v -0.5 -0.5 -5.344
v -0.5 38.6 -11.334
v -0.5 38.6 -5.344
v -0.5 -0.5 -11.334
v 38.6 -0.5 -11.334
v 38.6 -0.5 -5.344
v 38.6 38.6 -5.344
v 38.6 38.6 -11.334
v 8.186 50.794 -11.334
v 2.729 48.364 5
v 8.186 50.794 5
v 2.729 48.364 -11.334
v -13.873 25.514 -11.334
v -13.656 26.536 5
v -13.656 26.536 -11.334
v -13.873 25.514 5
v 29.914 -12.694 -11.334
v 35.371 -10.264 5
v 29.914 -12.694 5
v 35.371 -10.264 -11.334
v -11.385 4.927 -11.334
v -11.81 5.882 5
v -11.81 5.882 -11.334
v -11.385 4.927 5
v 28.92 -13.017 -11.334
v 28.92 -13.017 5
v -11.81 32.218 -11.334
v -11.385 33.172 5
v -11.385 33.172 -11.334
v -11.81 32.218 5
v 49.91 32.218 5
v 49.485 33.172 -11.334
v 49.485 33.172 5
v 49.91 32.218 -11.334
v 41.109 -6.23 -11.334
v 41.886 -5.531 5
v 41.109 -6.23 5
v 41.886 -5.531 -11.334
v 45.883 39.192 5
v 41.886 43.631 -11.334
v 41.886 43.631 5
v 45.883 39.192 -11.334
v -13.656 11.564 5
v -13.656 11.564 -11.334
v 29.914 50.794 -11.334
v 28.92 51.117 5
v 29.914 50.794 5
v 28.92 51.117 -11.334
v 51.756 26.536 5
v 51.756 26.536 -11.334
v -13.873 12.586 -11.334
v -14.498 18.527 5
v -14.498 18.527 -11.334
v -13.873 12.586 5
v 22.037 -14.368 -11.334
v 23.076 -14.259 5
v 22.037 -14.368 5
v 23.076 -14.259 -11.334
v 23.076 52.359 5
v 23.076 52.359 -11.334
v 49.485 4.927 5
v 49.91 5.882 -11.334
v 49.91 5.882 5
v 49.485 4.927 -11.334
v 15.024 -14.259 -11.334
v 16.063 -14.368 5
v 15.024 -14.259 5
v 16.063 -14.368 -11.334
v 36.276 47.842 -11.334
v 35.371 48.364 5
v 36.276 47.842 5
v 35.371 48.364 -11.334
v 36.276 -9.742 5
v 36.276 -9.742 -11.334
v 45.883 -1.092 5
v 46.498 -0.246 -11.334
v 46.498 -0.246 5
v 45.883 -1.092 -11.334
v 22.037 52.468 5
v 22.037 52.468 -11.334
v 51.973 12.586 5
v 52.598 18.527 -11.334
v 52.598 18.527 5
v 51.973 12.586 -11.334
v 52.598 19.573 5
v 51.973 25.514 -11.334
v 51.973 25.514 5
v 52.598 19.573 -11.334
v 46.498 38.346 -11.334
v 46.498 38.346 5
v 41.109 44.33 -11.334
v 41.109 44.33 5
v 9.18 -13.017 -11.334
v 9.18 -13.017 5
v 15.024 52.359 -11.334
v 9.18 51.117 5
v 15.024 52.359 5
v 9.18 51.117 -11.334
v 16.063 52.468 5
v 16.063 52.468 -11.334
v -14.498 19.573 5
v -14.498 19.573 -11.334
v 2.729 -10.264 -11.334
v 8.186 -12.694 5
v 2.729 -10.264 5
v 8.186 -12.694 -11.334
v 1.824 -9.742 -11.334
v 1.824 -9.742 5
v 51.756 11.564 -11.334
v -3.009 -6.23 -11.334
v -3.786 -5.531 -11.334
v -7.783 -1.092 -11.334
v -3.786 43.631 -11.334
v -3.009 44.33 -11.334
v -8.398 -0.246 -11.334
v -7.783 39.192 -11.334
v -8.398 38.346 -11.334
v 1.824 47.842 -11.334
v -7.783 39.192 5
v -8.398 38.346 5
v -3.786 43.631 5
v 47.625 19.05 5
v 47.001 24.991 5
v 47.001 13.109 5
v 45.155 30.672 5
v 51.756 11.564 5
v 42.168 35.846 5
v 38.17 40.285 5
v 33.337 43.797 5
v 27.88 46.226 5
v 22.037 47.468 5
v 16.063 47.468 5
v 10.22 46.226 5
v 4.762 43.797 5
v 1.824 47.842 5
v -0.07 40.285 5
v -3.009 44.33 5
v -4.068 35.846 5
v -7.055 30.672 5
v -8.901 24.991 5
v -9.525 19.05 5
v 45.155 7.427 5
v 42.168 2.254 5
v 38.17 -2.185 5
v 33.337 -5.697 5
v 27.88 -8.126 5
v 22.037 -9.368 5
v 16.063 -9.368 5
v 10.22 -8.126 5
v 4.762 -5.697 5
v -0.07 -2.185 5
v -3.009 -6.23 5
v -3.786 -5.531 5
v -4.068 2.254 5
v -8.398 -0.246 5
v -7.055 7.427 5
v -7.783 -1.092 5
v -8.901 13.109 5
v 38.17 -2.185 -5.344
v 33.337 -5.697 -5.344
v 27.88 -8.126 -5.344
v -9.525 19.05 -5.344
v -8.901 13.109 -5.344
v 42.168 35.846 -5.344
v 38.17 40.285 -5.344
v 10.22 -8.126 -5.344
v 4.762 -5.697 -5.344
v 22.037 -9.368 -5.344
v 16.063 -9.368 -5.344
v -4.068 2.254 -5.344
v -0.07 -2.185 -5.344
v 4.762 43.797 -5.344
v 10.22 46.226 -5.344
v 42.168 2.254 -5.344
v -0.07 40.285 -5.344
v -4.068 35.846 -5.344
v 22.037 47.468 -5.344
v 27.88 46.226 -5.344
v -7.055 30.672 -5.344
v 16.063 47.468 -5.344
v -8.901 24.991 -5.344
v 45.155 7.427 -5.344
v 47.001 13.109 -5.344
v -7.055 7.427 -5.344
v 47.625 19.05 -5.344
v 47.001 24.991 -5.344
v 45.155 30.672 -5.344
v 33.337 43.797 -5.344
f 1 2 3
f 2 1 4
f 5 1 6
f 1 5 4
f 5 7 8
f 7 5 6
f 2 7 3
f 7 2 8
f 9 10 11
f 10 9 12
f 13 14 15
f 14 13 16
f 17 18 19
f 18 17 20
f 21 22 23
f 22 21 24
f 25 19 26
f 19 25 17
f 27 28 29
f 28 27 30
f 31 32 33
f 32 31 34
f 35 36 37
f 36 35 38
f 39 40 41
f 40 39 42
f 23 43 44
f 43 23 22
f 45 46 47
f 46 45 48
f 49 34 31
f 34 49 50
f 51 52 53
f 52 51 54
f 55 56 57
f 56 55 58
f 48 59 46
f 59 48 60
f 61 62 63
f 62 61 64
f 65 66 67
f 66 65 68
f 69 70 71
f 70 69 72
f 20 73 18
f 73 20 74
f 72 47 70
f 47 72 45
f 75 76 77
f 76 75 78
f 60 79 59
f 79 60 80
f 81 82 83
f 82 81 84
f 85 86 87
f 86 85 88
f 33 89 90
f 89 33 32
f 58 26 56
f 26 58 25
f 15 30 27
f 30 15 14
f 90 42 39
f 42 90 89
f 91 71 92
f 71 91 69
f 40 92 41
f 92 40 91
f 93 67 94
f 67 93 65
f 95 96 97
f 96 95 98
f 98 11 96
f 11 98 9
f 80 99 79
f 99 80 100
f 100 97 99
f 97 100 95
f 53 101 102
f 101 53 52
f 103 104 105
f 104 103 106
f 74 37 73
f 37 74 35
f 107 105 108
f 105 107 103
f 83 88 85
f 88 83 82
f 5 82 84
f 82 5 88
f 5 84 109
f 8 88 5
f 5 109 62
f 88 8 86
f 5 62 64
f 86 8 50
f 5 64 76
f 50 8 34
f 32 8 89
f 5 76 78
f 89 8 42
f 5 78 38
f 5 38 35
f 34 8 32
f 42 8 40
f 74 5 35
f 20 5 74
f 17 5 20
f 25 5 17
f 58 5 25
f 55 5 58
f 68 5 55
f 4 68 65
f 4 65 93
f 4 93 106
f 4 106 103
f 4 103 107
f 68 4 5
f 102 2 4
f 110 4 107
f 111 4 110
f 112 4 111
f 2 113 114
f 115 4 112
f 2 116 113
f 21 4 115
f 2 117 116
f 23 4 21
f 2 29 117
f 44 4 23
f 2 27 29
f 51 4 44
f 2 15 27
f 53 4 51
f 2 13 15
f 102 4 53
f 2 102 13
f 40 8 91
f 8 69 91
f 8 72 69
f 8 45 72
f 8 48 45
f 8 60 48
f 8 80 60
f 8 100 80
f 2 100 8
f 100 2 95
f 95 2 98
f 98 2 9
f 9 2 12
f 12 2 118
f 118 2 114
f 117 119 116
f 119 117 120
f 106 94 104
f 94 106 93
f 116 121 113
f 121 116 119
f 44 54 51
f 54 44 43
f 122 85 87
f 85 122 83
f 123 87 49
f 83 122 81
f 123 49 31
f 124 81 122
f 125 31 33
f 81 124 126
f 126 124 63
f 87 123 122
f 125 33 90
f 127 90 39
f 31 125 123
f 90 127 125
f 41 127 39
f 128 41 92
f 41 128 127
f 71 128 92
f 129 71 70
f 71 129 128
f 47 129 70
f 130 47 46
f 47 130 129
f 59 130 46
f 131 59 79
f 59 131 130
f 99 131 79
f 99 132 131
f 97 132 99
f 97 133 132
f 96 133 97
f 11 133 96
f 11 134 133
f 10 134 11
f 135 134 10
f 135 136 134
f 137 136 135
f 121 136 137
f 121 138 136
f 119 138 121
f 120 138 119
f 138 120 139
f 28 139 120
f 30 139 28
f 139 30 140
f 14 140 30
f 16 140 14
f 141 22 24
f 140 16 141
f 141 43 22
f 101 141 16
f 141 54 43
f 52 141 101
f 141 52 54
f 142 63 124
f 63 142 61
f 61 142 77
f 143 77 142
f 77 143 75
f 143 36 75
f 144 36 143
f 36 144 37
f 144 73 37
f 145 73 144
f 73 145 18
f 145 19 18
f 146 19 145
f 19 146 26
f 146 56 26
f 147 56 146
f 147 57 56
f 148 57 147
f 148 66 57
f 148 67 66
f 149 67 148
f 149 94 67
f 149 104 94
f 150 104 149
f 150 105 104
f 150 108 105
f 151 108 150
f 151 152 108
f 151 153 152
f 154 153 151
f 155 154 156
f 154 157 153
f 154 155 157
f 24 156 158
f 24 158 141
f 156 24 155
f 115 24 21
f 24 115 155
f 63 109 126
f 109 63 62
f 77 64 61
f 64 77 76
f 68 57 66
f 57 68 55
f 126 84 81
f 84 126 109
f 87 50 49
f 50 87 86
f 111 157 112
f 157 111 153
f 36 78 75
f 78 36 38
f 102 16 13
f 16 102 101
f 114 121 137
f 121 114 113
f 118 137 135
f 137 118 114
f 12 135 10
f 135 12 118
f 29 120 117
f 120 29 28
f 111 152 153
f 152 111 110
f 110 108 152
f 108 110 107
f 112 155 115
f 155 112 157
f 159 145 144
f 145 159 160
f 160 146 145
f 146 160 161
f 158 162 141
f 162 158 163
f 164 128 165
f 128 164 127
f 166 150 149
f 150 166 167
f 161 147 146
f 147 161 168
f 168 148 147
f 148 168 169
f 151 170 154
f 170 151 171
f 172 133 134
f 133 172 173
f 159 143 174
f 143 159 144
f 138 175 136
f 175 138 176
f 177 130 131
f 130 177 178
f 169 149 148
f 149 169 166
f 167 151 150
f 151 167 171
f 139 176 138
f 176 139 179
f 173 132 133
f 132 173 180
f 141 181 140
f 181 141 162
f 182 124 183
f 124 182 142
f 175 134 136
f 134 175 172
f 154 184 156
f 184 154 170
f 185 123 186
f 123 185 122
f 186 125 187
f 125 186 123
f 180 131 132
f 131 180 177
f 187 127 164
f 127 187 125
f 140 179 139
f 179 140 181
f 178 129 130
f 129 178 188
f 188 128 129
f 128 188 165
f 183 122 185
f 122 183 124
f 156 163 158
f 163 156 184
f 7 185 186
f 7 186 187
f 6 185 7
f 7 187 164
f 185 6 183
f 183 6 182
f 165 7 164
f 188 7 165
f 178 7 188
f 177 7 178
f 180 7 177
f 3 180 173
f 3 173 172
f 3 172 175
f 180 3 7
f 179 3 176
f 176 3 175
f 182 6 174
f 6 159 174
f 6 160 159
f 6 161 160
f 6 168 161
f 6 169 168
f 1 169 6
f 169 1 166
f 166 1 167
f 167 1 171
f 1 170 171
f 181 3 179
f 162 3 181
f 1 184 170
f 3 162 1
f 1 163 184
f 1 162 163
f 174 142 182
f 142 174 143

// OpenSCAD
// file: ../../lib/circuits/helpers.scad
function bu(u) = u * 2.54;

module breadboard_row(number, orientation="vertical") {
  children();
  if(number > 1) {
    if(orientation == "vertical") {
      translate([0,bu(1),0])
        breadboard_row(number-1, orientation=orientation) {
          children();
        }
    } else {
      translate([bu(1),0,0])
        breadboard_row(number-1, orientation=orientation){
          children();
        }
    }
  }
}
// file: ../../lib/switches/rgb.scad
include <../variables.scad>

module rgb_row_trace_connection(width, height, xpos, ypos, rgb, connections) {
  half_width = u_mm(width)/2;
  half_height = u_mm(height)/2;
  if(connections[3] == "connect") {
    translate([1-half_width,8.875,0]){
      circle(d=0.8,$fn=40);
      offset(0.4)
        polygon(points=[[0,-0.01],[0,0.01],[u_mm(-xpos)-2, u_mm(-ypos)+0.01],[u_mm(-xpos)-2, u_mm(-ypos)-0.01]]);
    }
    translate([1-half_width,4.9,0]){
      circle(d=0.8,$fn=40);
      offset(0.4)
        polygon(points=[[0,-0.01],[0,0.01],[u_mm(-xpos)-2, u_mm(-ypos)+0.01],[u_mm(-xpos)-2, u_mm(-ypos)-0.01]]);
    }
    translate([1-half_width,3.3,0]){
      circle(d=0.8,$fn=40);
      offset(0.4)
        polygon(points=[[0,-0.01],[0,0.01],[u_mm(-xpos)-2, u_mm(-ypos)+0.01],[u_mm(-xpos)-2, u_mm(-ypos)-0.01]]);
    }
  }
  if(connections[2] == "connect") {
    translate([half_width-1,8.875,0]) {
      circle(d=0.8,$fn=40);
    }
    translate([half_width-1,4.9,0]) {
      circle(d=0.8,$fn=40);
    }
    translate([half_width-1,3.3,0]){
      circle(d=0.8,$fn=40);
    }
  }
}

module rgb_pcb_drill(width=1, height=1, rgb=true, connections=["hole","hole","hole","hole"]) {
  half_width = u_mm(width)/2;
  half_height = u_mm(height)/2;
  translate([half_width,half_height,0]) {
    if(rgb == true) {
      // LED Hole
      translate([-1.875,3.4])
        square([3.75,3]);

      // LED D
      if(connections[3] == "hole")
        translate([1.3-half_width,8,0])
          circle(d=1,$fn=40);
      if(connections[2] == "hole")
        translate([half_width-1.3,8,0])
          circle(d=1,$fn=40);

      // LED G
      if(connections[3] == "hole")
        translate([1.3-half_width,5.4,0])
          circle(d=1,$fn=40);
      if(connections[2] == "hole")
        translate([half_width-1.3,5.4,0])
          circle(d=1,$fn=40);

      // LED V
      if(connections[3] == "hole")
        translate([1.3-half_width,2.8,0])
          circle(d=1,$fn=40);
      if(connections[2] == "hole")
        translate([half_width-1.3,2.8,0])
          circle(d=1,$fn=40);
    }

    children();
  }
}

module rgb_pcb_hole_traces(width=1, height=1, rgb=true, xpos=0, ypos=0, connections=["hole","hole","hole","hole"]) {
  half_width = u_mm(width)/2;
  half_height = u_mm(height)/2;
  translate([half_width,half_height,0]) {
    if(rgb == true) {
      // LED D
      if(connections[3] == "hole")
        translate([1.3-half_width,8,0])
          circle(d=2.5,$fn=40);
      if(connections[2] == "hole")
        translate([half_width-1.3,8,0])
          circle(d=2.5,$fn=40);

      // LED G
      if(connections[3] == "hole")
        translate([1.3-half_width,5.4,0])
          circle(d=2.5,$fn=40);
      if(connections[2] == "hole")
        translate([half_width-1.3,5.4,0])
          circle(d=2.5,$fn=40);

      // LED V
      if(connections[3] == "hole")
        translate([1.3-half_width,2.8,0])
          circle(d=2.5,$fn=40);
      if(connections[2] == "hole")
        translate([half_width-1.3,2.8,0])
          circle(d=2.5,$fn=40);
    }

    children();
  }
}

module rgb_pcb_traces(width=1, height=1, rgb=true, xpos=0, ypos=0, connections=["hole","hole","hole","hole"]) {
  half_width = u_mm(width)/2;
  half_height = u_mm(height)/2;
  rgb_pcb_hole_traces(width=width, height=height, rgb=rgb, connections=connections) {
    if(rgb == true) {
      rgb_row_trace_connection(width=width, height=height, xpos=xpos, ypos=ypos, rgb=rgb, connections=connections);
      v_left = connections[3] == "none" ? 1 : half_width-5;
      // LED G
      translate([1.25,5])
        square([2,2]);
      translate([2.7,8.5,0]) {
        length = connections[2] == "none" ? 2 : half_width-3.7; 
        square([length,0.75]);
      }
      translate([2.7,6.8])
        square([0.8,2.4]);
      translate([-3.5,6.2])
        square([7,0.8]);
      translate([-3.5,6.8])
        square([0.8,2.4]);
      translate([-4-v_left,8.5,0])
        square([v_left+1,0.75]);

      // LED D
      translate([-4-v_left,4.5,0])
        square([v_left,0.8]);
      translate([-4.5,4.5,0])
        square([0.8,1.3]);
      translate([-4.5,5,0])
        square([1.3,0.8]);
      translate([2,4,0])
        square([2,0.8]);
      translate([4,4,0])
        square([0.8,1.3]);
      translate([4,4.5,0]) {
        length = connections[2] == "none" ? 0 : half_width-5; 
        square([length,0.75]);
      }
      translate([-3.375,5])
        square([2,1.1]);
      translate([1.25,3.75])
        square([2,1.1]);

      // LED V
      v_right = connections[2] == "none" ? 0 : half_width-5.25;
      translate([-4-v_left,2.9,0])
        square([v_right+v_left+8.875,0.8]);
      translate([-3.375,3.5])
        square([2,1.35]);
    }

    children();
  }
}
// file: ../../lib/switches/base.scad
include <../variables.scad>
include <rgb.scad>

// ["top", "bottom", "left", "right"]

module switch_row_trace_connection(width, height, xpos, ypos, rgb, connections) {
  half_width = u_mm(width)/2;
  half_height = u_mm(height)/2;
  if(connections[3] == "connect") {
    translate([1-half_width,-5.5,0]){
      circle(d=0.8,$fn=40);
      offset(0.4)
        polygon(points=[[0,-0.01],[0,0.01],[u_mm(-xpos)-2, u_mm(-ypos)+0.01],[u_mm(-xpos)-2, u_mm(-ypos)-0.01]]);
    }
  }
  if(connections[2] == "connect") {
    translate([half_width-1,-5.5,0]) {
      circle(d=0.8,$fn=40);
    }
  }
}

module switch_column_trace_connection(width, height, xpos, ypos, rgb, connections, last_xpos=0, last_ypos=0) {
  half_width = u_mm(width)/2;
  half_height = u_mm(height)/2;
  if(connections[1] == "connect") {
    translate([-u_mm((width-1)/2)-0.9,half_height-1,0]) {
      circle(d=0.8,$fn=40);
      offset(0.4)
        polygon(points=[[0,-0.01],[0,0.01],[u_mm((width-1)/2),0.01],[u_mm((width-1)/2),-0.01]]);
    }
  }
  if(connections[0] == "connect") {
    y_off = u_mm(ypos-last_ypos);
    x_off = u_mm(last_xpos-xpos);
    translate([-0.875,-1-y_off-half_height,0]) {
      offset(0.4)
        polygon(points=[[-0.01+x_off,0],[0.01+x_off,0],[0.01,2+y_off],[-0.01,2+y_off]]);
      translate([x_off-0.01,0]) {
        offset(0.4)
          polygon(points=[[0,-0.01],[0,0.01],[u_mm((width-1)/2)+1,0.01],[u_mm((width-1)/2)+1,-0.01]]);
      }
    }
  }
}

module switch_base_pcb_drill(width=1, height=1, rgb=true, single=true, connections=["hole","hole","hole","hole"]) {
  half_width = u_mm(width)/2;
  half_height = u_mm(height)/2;
  rgb_pcb_drill(width=width, height=height, rgb=rgb, connections=connections) {
    // Row
    if(connections[2] == "hole")
      translate([half_width-1.3,-5.5,0])
        circle(d=1,$fn=40);
    if(connections[3] == "hole")
      translate([1.3-half_width,-5.5,0])
        circle(d=1,$fn=40);

    // Column
    if(connections[1] == "hole")
      translate([-1,half_height-1.25,0])
        circle(d=1,$fn=40);
    if(connections[0] == "hole")
      translate([-1,1.25-half_height,0])
        circle(d=1,$fn=40);

    children();
  }
}

module switch_base_pcb_traces(width=1, height=1, rgb=true, xpos=0, ypos=0, connections=["hole","hole","hole","hole"], last_xpos=0, last_ypos=0, single=true) {
  half_width = u_mm(width)/2;
  half_height = u_mm(height)/2;
  rgb_pcb_traces(width=width, height=height, rgb=rgb, xpos=xpos, ypos=ypos, connections=connections) {
    switch_row_trace_connection(width, height, xpos, ypos, rgb, connections);
    if(single && !rgb)
      switch_column_trace_connection(width, height, xpos, ypos, rgb, connections, last_xpos=last_xpos, last_ypos=last_ypos);

    // Row
    if(connections[2] == "hole")
      translate([half_width-1.3,-5.5,0])
        circle(d=2.5,$fn=40);
    if(connections[3] == "hole")
      translate([1.3-half_width,-5.5,0])
        circle(d=2.5,$fn=40);

    // Column
    if(connections[1] == "hole")
      translate([-1,half_height-1.25,0])
        circle(d=2.4,$fn=40);
    if(connections[0] == "hole")
      translate([-1,1.25-half_height,0])
        circle(d=2.4,$fn=40);

    children();
  }
}

module switch_base_pcb_traces_bottom(width=1, height=1, rgb=true, xpos=0, ypos=0, connections=["hole","hole","hole","hole"], last_xpos=0, last_ypos=0) {
  half_width = u_mm(width)/2;
  half_height = u_mm(height)/2;
  rgb_pcb_hole_traces(width=width, height=height, rgb=rgb, connections=connections) {
    switch_column_trace_connection(width, height, xpos, ypos, rgb, connections, last_xpos=last_xpos, last_ypos=last_ypos);

    // Row
    if(connections[2] == "hole")
      translate([half_width-1.3,-5.5,0])
        circle(d=2.5,$fn=40);
    if(connections[3] == "hole")
      translate([1.3-half_width,-5.5,0])
        circle(d=2.5,$fn=40);

    // Column
    if(connections[1] == "hole")
      translate([-1,half_height-1.25,0])
        circle(d=2.5,$fn=40);
    if(connections[0] == "hole")
      translate([-1,1.25-half_height,0])
        circle(d=2.5,$fn=40);

    children();
  }
}
// file: ../../lib/switches/footprints.scad
include <../variables.scad>
include <stabilizers.scad>

module pcb_switch_outline(width=1, height=1) {
  stab_extra = width >= 2 ? 2 : 0;
  translate([0,-stab_extra])
    square([u_mm(width)+0.01, u_mm(height)+0.01+stab_extra]);
}

module pcb_switch_space_outline(width=1, height=1, style="mx", cnc=false) {
  offset = height_for_style(style);
  stab_extra = width >= 2 ? 2 : 0;
  translate([-1,-1-stab_extra,2.834-offset])
    cube([u_mm(width) + 2, u_mm(height) + 2 + stab_extra, 1.166+offset]);
  translate([u_mm(width/2),u_mm(height/2)]) {
    translate([-7.5,-7.5,1.5-offset])
      cube([15,15,5]);
    translate([-7,-7,-10])
      cube([14,14,10]);
    translate([u_mm(-width/2)-0.5,u_mm(-height/2)-0.5,-20-offset])
      cube([u_mm(width)+1,u_mm(height)+1, 20]);
  }
  translate([hole_offset(width), hole_offset(height),-10])
    stab(width);
}
// file: ../../lib/switches/stabilizers.scad
module stab_hole_render(distance){
  translate([14+distance+3.375,6.99,0]) {
    circle(d=3.175, $fn=40);
    translate([0,-15.24,0])
      circle(d=4.064, $fn=40);
  }
  translate([-6.75-distance+3.375,6.99,0]) {
    circle(d=3.175, $fn=40);
    translate([0,-15.24,0])
      circle(d=4.064, $fn=40);
  }
}

module stab_holes(width) {
  if (width >= 7) {
    stab_hole_render(39.6);
  } else if (width >= 6) {
    stab_hole_render(39.6);
  } else if(width >= 2) {
    stab_hole_render(1.6);
  }
}

module stab_render(distance, cnc=false, height=5.334) {
  translate([14+distance,1.47,0]){
    // Right Side Large Hole
    cube([6.75,12.3,10]);

    // Add 1/16" corner holes for milling
    if(cnc){
      translate([0.56,0.56,0])
        cylinder(h=10,d=1.59,$fn=20);
      translate([6.75-0.56,0.56,0])
        cylinder(h=10,d=1.59,$fn=20);
      translate([0.56,12.3-0.56,0])
        cylinder(h=10,d=1.59,$fn=20);
      translate([6.75-0.56,12.3-0.56,0])
        cylinder(h=10,d=1.59,$fn=20);
    }
    translate([5.75,3.23,0]){
      // Side hole for notch
      cube([1.825,3.175,10]);
      translate([1.825,1.59,0])
        if(cnc)
          resize([1.59,3.175,10])
            cylinder(h=10,d=1.59,$fn=20);
    }
    translate([1.725,11.3,0]){
      // Top Notch
      cube([3.3,2.2,10]);
      if(cnc)
        translate([1.65,2.2,0])
          resize([3.3,1,10])
            cylinder(h=10,d=1,$fn=20);
    }
    // Thin out for clip
    translate([-1,-1,10-height+1.5])
      cube([8.75,14.3,height-1.5]);
  }
  translate([-6.75-distance,1.47,0]){
    // Left Side Large Hole
    cube([6.75,12.3,10]);
    translate([-0.825,3.23,0]){
      // Side hole for notch
      cube([1.825,3.175,10]);
      if(cnc)
        translate([0,1.59,0])
          resize([1.59,3.175,10])
            cylinder(h=10,d=1.59,$fn=20);

    }
    translate([1.725,11.3,0]){
      // Top Notch
      cube([3.3,2.2,10]);
      if(cnc)
        translate([1.65,2.2,0])
          resize([3.3,1,10])
            cylinder(h=10,d=1,$fn=20);
    }
    if(cnc){
      translate([0.56,0.56,0])
        cylinder(h=10,d=1.59,$fn=20);
      translate([6.75-0.56,0.56,0])
        cylinder(h=10,d=1.59,$fn=20);
      translate([0.56,12.3-0.56,0])
        cylinder(h=10,d=1.59,$fn=20);
      translate([6.75-0.56,12.3-0.56,0])
        cylinder(h=10,d=1.59,$fn=20);
    }
    // Thin out for clip
    translate([-1,-1,10-height+1.5])
      cube([8.75,14.3,height-1.5]);
  }
  // Center shaft for bar
  translate([-distance-2,4.7,0]){
    cube([distance*2+20,4.6,10]);
  }
}

module stab(key_width, cnc=false) {
  if (key_width >= 7) {
    stab_render(39.6, cnc=cnc);
  } else if (key_width >= 6) {
    stab_render(39.6, cnc=cnc);
  } else if(key_width >= 2) {
    stab_render(1.6, cnc=cnc);
  }
}
// file: ../../lib/circuits/wire.scad
module guage(guage=12) {
  fn=20;
  if(guage == 8) {
    circle(d=3.25, $fn=fn);
  } else if (guage == 10) {
    circle(d=2.59, $fn=fn);
  } else if (guage == 12) {
    circle(d=2.06, $fn=fn);
  } else if (guage == 14) {
    circle(d=1.57, $fn=fn);
  } else if (guage == 16) {
    circle(d=1.3, $fn=fn);
  }
}

module wire_pcb_drill(guage=12) {
  offset(0.1)
    guage(guage);
}

module wire_pcb_traces(guage=12) {
  offset(0.75)
    guage(guage);
}

module wire_pcb_outline(guage=12) {
  offset(1.5)
    guage(guage);
}

module wire_space_outline(guage=12) {
  linear_extrude(10)
    offset(0.1)
      guage(guage);
}
// file: ../../lib/circuits/trrs.scad
module trrs_post(d=1.2) {
  translate([0,-d/4,0]) {
    circle(d=d, $fn=20);
    translate([-d/2,0,0]) {
      square([d,(d/2-.2)]);
    }
    translate([0,(d/2-.2),0]) {
      circle(d=d, $fn=20);
    }
  }
}

module trrs_pcb_drill(side="left") {
  translate([2.8,1.5]) {
    circle(d=2, $fn=20);
  }
  translate([2.8,8.5]) {
    circle(d=2, $fn=20);
  }
  translate([0.5,11.3,0]) {
    trrs_post();
  }
  translate([5.1,3.2,0]) {
    trrs_post();
  }
  translate([5.1,6.2,0]) {
    trrs_post();
  }
  translate([5.1,10.2,0]) {
    trrs_post();
  }
  if(side != "none"){
    offset = side == "left" ? 7.6 : -2;
    translate([offset,11.3]) {
      circle(d=1.2, $fn=20);
    }
    translate([offset,8.3]) {
      circle(d=1.2, $fn=20);
    }
    translate([offset,5.3]) {
      circle(d=1.2, $fn=20);
    }
    translate([offset,2.2]) {
      circle(d=1.2, $fn=20);
    }
  }
}

module trrs_pcb_traces(side="left") {
  translate([-1,9.7,0]){
    difference() {
      square([3,3]);
      if(side == "right") {
        translate([3,-1.8]) {
          rotate(45) {
            square(2);
          }
        }
      }
    }
  }
  translate([3.6,1.2,0]){
    difference() {
      square([3,3.5]);
      if(side == "left") {
        translate([3,2.3]) {
          rotate(45) {
            square(2);
          }
        }
      }
    }
  }
  translate([3.6,4.8,0]){
    difference() {
        square([3,3.5]);
        if(side == "left") {
          translate([3,2.3]) {
            rotate(45) {
              square(2);
            }
          }
        }
    }
  }
  translate([3.6,8.4,0]){
    difference() {
      square([3,3.2]);
      if(side == "left") {
        translate([3,1.8]) {
          rotate(45) {
            square(2);
          }
        }
      }
    }
  }
  if(side != "none"){
    translate([side == "left" ? 7.6 : -2,0,0]){
      translate([0,11.3]) {
        circle(d=3, $fn=20);
      }
      translate([0,8.3]) {
        circle(d=2.9, $fn=20);
      }
      translate([0,5.3]) {
        circle(d=3, $fn=20);
      }
      translate([0,2.2]) {
        circle(d=3, $fn=20);
      }
    }
    translate([side == "left" ? 5.6 : -2,0,0]){
      left_trace = side == "left" ? 2.5 : 7.6;
      translate([0,2.2]) {
        square([left_trace,1.5]);
      }
      translate([0,5.1]) {
        square([left_trace,1.5]);
      }
      if(side == "left") {
        translate([0,8.7]) {
          square([left_trace,0.9]);
        }
      }
      else {
        translate([0,8]) {
          square([4,1.6]);
        }
        translate([4,9]) {
          square([4,1.6]);
        }
        translate([2.8,9.4]) {
          rotate(-45) {
            square([1,1.7]);
          }
        }
      }
    }
    translate([side == "left" ? 0.5 : -2,0,0]){
      right_trace = side == "left" ? 7.1 : 2;
      translate([0,11.7]) {
        square([right_trace,1.3]);
      }
      translate([0,12]) {
        circle(1, $fn=20);
      }
      translate([right_trace,11.8]) {
        circle(1, $fn=20);
      }
    }
  }
}

module trrs_pcb_outline(side="left") {
  translate([-1,0,0]) {
    square([7.6,13.1]);
  }
  if(side != "none"){
    translate([side == "left" ? 5.6 : -3.5, 0]) {
      square([4,13.1]);
    }
  }
}

module trrs_space_outline(side="left") {
  translate([0,0,-5.3]) {
    linear_extrude(7){
      translate([-2,-1,0])
        square([9.6,15.1]);
      translate([0,-12.1,0])
        square([5.6,12.1]);
      if(side != "none")
        translate([side == "left" ? 5.6 : -4.5, -1])
          square([5,15.1]);
    }
  }
  translate([3,-2,-2.6]) {
    rotate([90,0,0]) {
      cylinder(d=10, h=30, $fn=100);
    }
  }
}
// file: ../../lib/circuits/trace.scad
function vdef(vector, index) = len(vector) == index ? vector[index-1] : vector[index];
function vadd(vector, index, axis) = vdef(vector, index)[axis] > vdef(vector, index-1)[axis] ? 0.01 : -0.01;
function polygon_from_vector(vector) = 
  len(vector) > 0 ?
    concat(vector, 
      [for (i = [1:len(vector)]) 
        [vector[len(vector)-i][0]-vadd(vector, i, 0),vector[len(vector)-i][1]-vadd(vector, i, 1)]])
      : [];

function parse_loc(loc) = [
  loc[5],
  len(loc) < 7 ? "both" : loc[6],
  len(loc) < 8 ? "none" : loc[7],
];

module manual_trace_pcb_drill(location) {
  vector = parse_loc(location)[0];
  echo("holes", parse_loc(location)[2]);
  if(parse_loc(location)[2] == "holes" || parse_loc(location)[2] == "hole_begin") {
    translate(vector[0]) {
      circle(d=1, $fn=20);
    }
  }
  if(parse_loc(location)[2] == "holes" || parse_loc(location)[2] == "hole_end") {
    translate(vector[len(vector)-1]) {
      circle(d=1, $fn=20);
    }
  }
}

module manual_trace_pcb_traces(location) {
  vector = parse_loc(location)[0];
  if(parse_loc(location)[1] != "bottom") {
    offset(0.4) {
      polygon(points=polygon_from_vector(vector));
    }
  }
  if(parse_loc(location)[2] == "holes" || parse_loc(location)[2] == "hole_begin") {
    translate(vector[0]) {
      circle(d=2.5, $fn=20);
    }
  }
  if(parse_loc(location)[2] == "holes" || parse_loc(location)[2] == "hole_end") {
    translate(vector[len(vector)-1]) {
      circle(d=2.5, $fn=20);
    }
  }
}

module manual_trace_pcb_traces_bottom(location) {
  vector = parse_loc(location)[0];
  if(parse_loc(location)[1] != "top") {
    offset(0.4) {
      polygon(points=polygon_from_vector(vector));
    }
  }
  if(parse_loc(location)[2] == "holes" || parse_loc(location)[2] == "hole_begin") {
    translate(vector[0]) {
      circle(d=2.5, $fn=20);
    }
  }
  if(parse_loc(location)[2] == "holes" || parse_loc(location)[2] == "hole_end") {
    translate(vector[len(vector)-1]) {
      circle(d=2.5, $fn=20);
    }
  }
}

module manual_trace_pcb_outline(location) {
  vector = parse_loc(location)[0];
  echo("location", location);
  offset(1)
    polygon(points=polygon_from_vector(vector));

  if(parse_loc(location)[2] == "holes" || parse_loc(location)[2] == "hole_begin") {
    translate(vector[0]) {
      circle(d=4, $fn=20);
    }
  }
  if(parse_loc(location)[2] == "holes" || parse_loc(location)[2] == "hole_end") {
    translate(vector[len(vector)-1]) {
      circle(d=4, $fn=20);
    }
  }
}

module manual_trace_space_outline(location) {
  vector = parse_loc(location)[0];
  translate([0,0,-1])
    linear_extrude(2)
      offset(0.5)
        manual_trace_pcb_outline(vector);
}
// file: ../../lib/circuits/support.scad
module support_pcb_drill(mm=2) {
  offset(0.1)
    circle(d=mm, $fn=20);
}

module support_pcb_traces(mm=2) {
}

module support_pcb_outline(mm=2) {
  offset(2)
    circle(d=mm, $fn=20);
}

module support_space_outline(mm=2) {
  linear_extrude(10)
    offset(0.1)
      circle(d=mm, $fn=20);
}
// file: ../../lib/circuits/proton_c.scad
use <helpers.scad>

module proton_c_pcb_drill(size="full") {
  translate([bu(0.5),bu(1.5),0]) {
    translate([0,bu(1)])
      breadboard_row(4, "horizontal"){
        circle(d=1, $fn=20);
        translate([0,bu(1)])
          circle(d=1, $fn=20);
      }
    translate([bu(4),bu(1)])
      breadboard_row(2)
        circle(d=1, $fn=20);
    translate([bu(4),bu(3)])
      breadboard_row(2)
        circle(d=1, $fn=20);
    circle(d=1, $fn=20);
    translate([bu(1),0,0])
      circle(d=1, $fn=20);
    translate([bu(5),0,0])
      circle(d=1, $fn=20);
    translate([bu(6),0,0])
      circle(d=1, $fn=20);
    breadboard_row(12) {
      circle(d=1, $fn=20);
      translate([bu(1),0,0])
        circle(d=1, $fn=20);
      translate([bu(5),0,0])
        circle(d=1, $fn=20);
      translate([bu(6),0,0])
        circle(d=1, $fn=20);
    }
    if(size == "full")
      translate([0,bu(13)])
        breadboard_row(6) {
          circle(d=1, $fn=20);
          translate([bu(1),0,0])
            circle(d=1, $fn=20);
          translate([bu(5),0,0])
            circle(d=1, $fn=20);
          translate([bu(6),0,0])
            circle(d=1, $fn=20);
    }
  }
}

module proton_c_pcb_traces(size="full") {
  translate([bu(0.5),bu(1.5),0]) {
    translate([0,bu(1)])
      breadboard_row(4, "horizontal"){
        circle(d=2.4, $fn=20);
        translate([-1,0])
          square([2,bu(1)]);
        translate([0,bu(1)])
          circle(d=2.4, $fn=20);
      }
    translate([0,bu(1)])
      breadboard_row(2) {
        translate([bu(5),0])
          circle(d=2.4, $fn=20);
        translate([bu(5),-1,0])
          square([bu(1),2]);
        translate([bu(6),0,0])
          circle(d=2.4, $fn=20);
      }
    translate([bu(4),bu(1)]){
      translate([-0.75,-1])
        square([1.5,bu(2)-2]);
      breadboard_row(2)
        circle(d=2.4, $fn=20);
      translate([0,-0.75])
        square([bu(2),1.5]);
    }
    translate([bu(4),bu(3)]){
      translate([-0.75,-1])
        square([1.5,bu(2)-2]);
      breadboard_row(2)
        circle(d=2.4, $fn=20);
      translate([0,-0.75])
        square([bu(2),1.5]);
    }
    circle(d=2.4, $fn=20);
    translate([0,-1,0])
      square([bu(1),2]);
    translate([bu(1),0,0])
      circle(d=2.4, $fn=20);
    translate([bu(5),0])
      circle(d=2.4, $fn=20);
    translate([bu(5),-1,0])
      square([bu(1),2]);
    translate([bu(6),0,0])
      circle(d=2.4, $fn=20);
    translate([0,bu(3)])
      breadboard_row(9) {
        circle(d=2.4, $fn=20);
        translate([0,-1,0])
          square([bu(1),2]);
        translate([bu(1),0,0])
          circle(d=2.4, $fn=20);
        translate([bu(5),0])
          circle(d=2.4, $fn=20);
        translate([bu(5),-1,0])
          square([bu(1),2]);
        translate([bu(6),0,0])
          circle(d=2.4, $fn=20);
      }
    if(size == "full")
      translate([0,bu(13)])
        breadboard_row(6) {
          circle(d=2.4, $fn=20);
          translate([0,-1,0])
            square([bu(1),2]);
          translate([bu(1),0,0])
            circle(d=2.4, $fn=20);
          translate([bu(5),0])
            circle(d=2.4, $fn=20);
          translate([bu(5),-1,0])
            square([bu(1),2]);
          translate([bu(6),0,0])
            circle(d=2.4, $fn=20);
        }
  }
}

module proton_c_pcb_outline(size="full") {
  translate([0,bu(1)])
  square([bu(7), bu(size == "full" ? 19 : 12)]);
}

module proton_c_space_outline(size="full") {
  translate([0,0,-4]) {
    linear_extrude(6) {
      translate([-bu(0.5),-bu(0.5)])
        square([bu(8), bu(size == "full" ? 21 : 14)]);
    }
    linear_extrude(5) {
      translate([bu(0.5),-bu(15),0])
        square([bu(6),bu(25)]);
    }
  }
}
// file: ../../lib/circuits/pro_micro.scad
use <helpers.scad>

module pro_micro_pcb_drill(connections="holes") {
  translate([bu(0.5),bu(1.5),0]) {
    if(connections == "holes"){
      translate([bu(3),bu(1)])
        breadboard_row(3)
          circle(d=1, $fn=20);
      translate([bu(4),bu(3)])
        breadboard_row(3)
          circle(d=1, $fn=20);
    }
    breadboard_row(12) {
      circle(d=1, $fn=20);
      if(connections == "holes") {
        translate([bu(1),0,0])
          circle(d=1, $fn=20);
        translate([bu(5),0,0])
          circle(d=1, $fn=20);
      }
      translate([bu(6),0,0])
        circle(d=1, $fn=20);
    }
  }
}

module pro_micro_pcb_traces(connections="holes") {
  translate([bu(0.5),bu(1.5),0]) {
    // GRND
    if(connections == "holes"){
      translate([bu(3),bu(1)]){
        translate([-0.75,-1])
          square([1.5,bu(3)-2]);
        breadboard_row(3)
          circle(d=2.4, $fn=20);
        translate([0,-0.75])
          square([bu(2),1.5]);
      }
      translate([bu(4),bu(3)]){
        translate([-0.75,-1])
          square([1.5,bu(3)-2]);
        breadboard_row(3)
          circle(d=2.4, $fn=20);
        translate([0,-0.75])
          square([bu(2),1.5]);
      }
    }
    breadboard_row(12) {
      circle(d=2.4, $fn=20);
      if(connections == "holes") {
        translate([0,-1,0])
          square([bu(1),2]);
        translate([bu(1),0,0])
          circle(d=2.4, $fn=20);
        translate([bu(5),0])  
          circle(d=2.4, $fn=20);
        translate([bu(5),-1,0])
          square([bu(1),2]);
      }
      translate([bu(6),0,0])
        circle(d=2.4, $fn=20);
    }
  }
}

module pro_micro_pcb_outline() {
  translate([0,bu(1)])
  square([bu(7), bu(12)]);
}

module pro_micro_space_outline() {
  translate([0,0,-4]) {
    linear_extrude(6) {
      translate([-bu(0.5),-bu(0.5)])
        square([bu(8), bu(14)]);
    }
    linear_extrude(5) {
      translate([bu(0.5),-bu(15),0])
        square([bu(6),bu(25)]);
    }
  }
}
// file: ../../lib/circuits/mts_101.scad
use <../variables.scad>
module mts_101_pcb_drill() {
  translate([0,1.25]) {
    translate([2.5,0])
      square([3,1]);
    translate([1.25,0.5])
      circle(d=1,$fn=40);
    translate([6.75,0.5])
      circle(d=1,$fn=40);

    translate([2.5,4.75])
      square([3,1]);
    translate([1.25,5.25])
      circle(d=1,$fn=40);
    translate([6.75,5.25])
      circle(d=1,$fn=40);

    translate([4,10])
      circle(d=1,$fn=40);
    translate([1.25,10])
      circle(d=1,$fn=40);
    translate([6.75,10])
      circle(d=1,$fn=40);
  }
}

module mts_101_pcb_traces() {
  translate([0,1.25]) {
    translate([2,-0.5])
      square([4,2]);
    translate([1.25,0.5])
      circle(d=2,$fn=40);
    translate([6.75,0.5])
      circle(d=2,$fn=40);

    translate([2,4.25])
      square([4,2]);
    translate([1.25,5.25])
      circle(d=2,$fn=40);
    translate([6.75,5.25])
      circle(d=2,$fn=40);

    translate([4,10])
      circle(d=2,$fn=40);
    translate([1.25,9.5])
      square([6,1]);
    translate([1.25,10])
      circle(d=2,$fn=40);
    translate([6.75,10])
      circle(d=2,$fn=40);
  }
}

module mts_101_pcb_outline() {
  square([8,13]);
}

module mts_101_space_outline(, cnc=false) {
  translate([-0.5,-0.5,-10])
    cube([9,14, 14.4]);
  translate([4,6.5,-26]) {
    cylinder(d=6, h=18, $fn=30);
    cylinder(d=12, h=10, $fn=60);
  }
}
// file: ../../lib/circuits/ec11.scad
use <../variables.scad>
use <../switches/base.scad>

module 1u_centered() {
  translate([u_mm(0.5),u_mm(0.5)])
    children();
}

module ec11_pcb_drill(single=false, connections=["hole","hole","hole","hole"]) {
  switch_base_pcb_drill(rgb=false, connections=connections) {
    // Key Column
    translate([-3,0,0])
      circle(d=1,$fn=40);

    // Key Row
    translate([7,2.5])
      circle(d=1, $fn=20);

    if(single) {
      translate([4.25,-3,0])
        circle(d=1, $fn=20);
      translate([-3,-3.25,0])
        circle(d=1,$fn=40);
    }
    translate([4.25,0,0])
      circle(d=1, $fn=20);

    translate([7,-2.5])
      circle(d=1, $fn=20);

    if(connections[3] == "hole"){
      translate([-5.5,2.5])
        circle(d=1, $fn=20);
      translate([-5.5,0])
        circle(d=1, $fn=20);
      translate([-5.5,-2.5])
        circle(d=1, $fn=20);
    }
    translate([-7.5,-2.5])
      circle(d=1, $fn=20);
    translate([-7.5,2.5])
      circle(d=1, $fn=20);
    translate([-7.5,0])
      circle(d=1, $fn=20);

    translate([-1.3,-6.25])
      square([2.6,1.5]);
    translate([-1.3,4.75])
      square([2.6,1.5]);
  }
}

module ec11_pcb_traces(single=false, connections=["hole","hole","hole","hole"]) {
  switch_base_pcb_traces(single=single, rgb=false, connections=connections) {
    // Key Row
    if(single){
      translate([2,2.2])
        square([4.5,0.8]);
      r_len = connections[0] != "none" ? u_mm(0.5)-1 : 6;
      l_len = connections[1] != "none" ? u_mm(0.5)-1 : 6;
      translate([2,-r_len])
        square([0.8,r_len+l_len]);
      if(connections[0] != "none")
        translate([-2,1-u_mm(0.5)])
          square([4,0.8]);
      if(connections[1] != "none")
        translate([-2.1,u_mm(0.5)-1.6])
          square([4.9,0.8]);
    }
    translate([7,2.5])
      circle(d=2.5,$fn=40);

    // Key Column
    if(connections[3] != "none")
      translate([1-u_mm(0.5),-6])
        square([u_mm(0.5)-4,1]);
    translate([-3.25,-6])
      square([0.8,5]);
    translate([-3,0])
      circle(d=2.5,$fn=40);

    if(single){
      translate([-3,-3.25])
        circle(d=2.5,$fn=40);
      translate([4.25,-3])
        circle(d=2.5,$fn=40);
    } else {
      translate([-3,-3.25])
        square([7.8,0.8]);
    }

    translate([7,-2.5])
      circle(d=2.5,$fn=40);
    translate([4.25,0]) {
      circle(d=2.5,$fn=40);
      rotate(-45)
        square([5,0.8]);
    }

    translate([4,-6])
      square([0.8,3]);
    if(connections[2] != "none")
      translate([4,-6])
        square([4.5,0.8]);

    if(connections[3] == "hole"){
      translate([-5.5,2.5])
        circle(d=2.25, $fn=20);
      translate([-5.5,0])
        circle(d=2.25, $fn=20);
      translate([-5.5,-2.5])
        circle(d=2.25, $fn=20);
    }
    translate([-7.5,-2.5])
      circle(d=2.25, $fn=20);
    translate([-7.5,2.5])
      circle(d=2.25, $fn=20);
    translate([-7.5,0])
      circle(d=2.25, $fn=20);
  }
}

module ec11_pcb_traces_bottom(connections=["hole","hole","hole","hole"]) {
  switch_base_pcb_traces_bottom(rgb=false, connections=connections) {
    // Key Row
    translate([2,2.2])
      square([4.5,0.8]);
    r_len = connections[0] != "none" ? u_mm(0.5)-1 : 6;
    l_len = connections[1] != "none" ? u_mm(0.5)-1 : 6;
    translate([2,-r_len])
      square([0.8,r_len+l_len]);
    
    if(connections[0] != "none")
      translate([-1.3,1-u_mm(0.5)])
        square([4,0.8]);
    if(connections[1] != "none")
      translate([-1,u_mm(0.5)-1.4])
        square([3.8,0.8]);
    translate([7,2.5])
      circle(d=2.5,$fn=40);

    // Key Column
    translate([-3,0])
      circle(d=2.5,$fn=40);

    translate([7,-2.5])
      circle(d=2.5,$fn=40);
    translate([4.25,0]) {
      circle(d=2.5,$fn=40);
    }

    if(connections[3] == "hole"){
      translate([-5.5,2.5])
        circle(d=2.25, $fn=20);
      translate([-5.5,0])
        circle(d=2.25, $fn=20);
      translate([-5.5,-2.5])
        circle(d=2.25, $fn=20);
    }
    translate([-7.5,-2.5])
      circle(d=2.25, $fn=20);
    translate([-7.5,2.5])
      circle(d=2.25, $fn=20);
    translate([-7.5,0])
      circle(d=2.25, $fn=20);
  }
}

module ec11_pcb_outline() {
  square([u_mm(1), u_mm(1)]);
}

module ec11_space_outline() {
  translate([-0.5,-0.5, -6])
    cube([u_mm(1)+1, u_mm(1)+1, 8]);
  1u_centered() {
    translate([0,0,-15])
      linear_extrude(15)
        circle(d=7, $fn=30);
    translate([0,0,-25])
      linear_extrude(15)
        circle(d=19, $fn=80);
  }
}
// file: ../../lib/switches/choc_v1.scad
include <../variables.scad>
include <stabilizers.scad>
include <footprints.scad>

module switch_choc_v1_pcb_drill(width=1, height=1) {
  half_width = u_mm(width)/2;
  half_height = u_mm(height)/2;
  translate([half_width,half_height,0]) {
    circle(d=3.5, $fn=30);

    translate([-5.5,0])
      circle(d=2, $fn=30);
    translate([3,3.8])
      circle(d=1, $fn=30);
    translate([-4, 3.8])
      circle(d=1, $fn=30);
    translate([-4,1.25-half_height])
      circle(d=1, $fn=30);
    translate([-4, half_height-3])
      circle(d=1, $fn=30);

    translate([5.5,0])
      circle(d=2, $fn=30);
    translate([0,5.9])
      circle(d=1.3, $fn=30);
    translate([5,3.8])
      circle(d=1.3, $fn=30);
    translate([1-half_width, half_height-1])
      circle(d=1, $fn=30);
    translate([half_width-1, half_height-1])
      circle(d=1, $fn=30);
  }
}

module switch_choc_v1_pcb_traces(width=1, height=1) {
  half_width = u_mm(width)/2;
  half_height = u_mm(height)/2;
  translate([half_width,half_height,0]) {
    translate([5,3.8])
      circle(d=2.8, $fn=30);
    translate([3,3.8])
      circle(d=2.5, $fn=30);
    translate([-4, 3.8])
      circle(d=2.5, $fn=30);
    translate([-4.5, 2-half_height])
      square([1, u_mm(height)-4]);
    translate([-4,1.25-half_height])
      circle(d=2.5, $fn=30);
    translate([-4, half_height-3])
      circle(d=2.5, $fn=30);

    translate([0,5.9])
      circle(d=2.8, $fn=30);
    translate([-0.5, 5.9])
      square([1, half_height-6.9]);
    translate([1-half_width, half_height-1.5])
      square([half_width*2-2, 1]);
    translate([1-half_width, half_height-1])
      circle(d=2.5, $fn=30);
    translate([half_width-1, half_height-1])
      circle(d=2.5, $fn=30);
  }
}

module switch_choc_v1_pcb_outline(width=1, height=1) {
  pcb_switch_outline(width=width, height=height);
}
// file: ../../lib/switches/mx.scad
include <../variables.scad>
include <stabilizers.scad>
include <footprints.scad>
include <base.scad>
include <rgb.scad>

module switch_mx_pcb_drill(width=1, height=1, rgb=true, single=true, connections=["hole","hole","hole","hole"]) {
  half_width = u_mm(width)/2;
  half_height = u_mm(height)/2;
  translate([hole_offset(width), half_height]) {
    stab_holes(width);
  }

  switch_base_pcb_drill(width=width, height=height, single=single, rgb=rgb, connections=connections) {
    circle(d=4,$fn=40);
    translate([-3.8,-2.5,0])
      circle(d=1.7,$fn=40);
    translate([2.5,-5,0])
      circle(d=1.7,$fn=40);
    translate([5,0,0])
      circle(d=1.75,$fn=40);
    translate([-5,0,0])
      circle(d=1.75,$fn=40);

    // Column
    translate([-1.2,-3,0])
      circle(d=1,$fn=40);
    translate([5,-2,0])
      circle(d=1,$fn=40);
    if(single){
      translate([6,-3.7,0])
        circle(d=1,$fn=40);
      if(rgb) {
        translate([5,1.7,0])
          circle(d=1,$fn=40);
      } else {
        translate([6,-8.3,0])
          circle(d=1,$fn=40);
      }
    }
  }
}

module switch_mx_pcb_traces(width=1, height=1, rgb=true, single=true, xpos=0, ypos=0, connections=["hole","hole","hole","hole"], last_xpos=0, last_ypos=0) {
  half_width = u_mm(width)/2;
  half_height = u_mm(height)/2;
  switch_base_pcb_traces(width=width, height=height, rgb=rgb, xpos=xpos, ypos=ypos, connections=connections, last_xpos=last_xpos, last_ypos=last_ypos, single=single) {
    translate([-3.8,-2.5,0])
      circle(d=4,$fn=40);
    translate([2.5,-5,0])
      circle(d=4,$fn=40);

    // Row
    v_left = connections[3] == "none" ? 1 : half_width;
    v_right = connections[2] == "none" ? 1 : half_width-5;
    translate([1-v_left,-5.9,0])
      square([v_left+v_right+3,0.8]);

    // Column
    translate([-1.2,-3,0])
      circle(d=2.5,$fn=40);
    translate([5,-2,0])
      circle(d=2.5,$fn=40);
    if(single){
      translate([6,-3.7,0])
        circle(d=2.5,$fn=40);
      difference() {
        translate([5,0,0])
          circle(d=3.55,$fn=40);
        translate([5,-2,0])
          square(4);
      }
      if(rgb) {
        translate([5,1.7,0])
          circle(d=2.3,$fn=40);
      } else {
        translate([4.2,1])
          square([0.8, half_height-2]);
        translate([-1,half_height-1.5])
          square([6,0.8]);
        translate([6,-8.3,0])
          circle(d=2.5,$fn=40);
        translate([-1.3,-8.7,0])
          square([7,0.8]);
      }
    }
  }
}

module switch_mx_pcb_traces_bottom(width=1, height=1, rgb=true, xpos=0, ypos=0, connections=["hole","hole","hole","hole"], last_xpos=0, last_ypos=0) {
  half_width = u_mm(width)/2;
  half_height = u_mm(height)/2;
  switch_base_pcb_traces_bottom(width=width, height=height, rgb=rgb, xpos=xpos, ypos=ypos, connections=connections, last_xpos=last_xpos, last_ypos=last_ypos) {
    translate([-3.8,-2.5,0])
      circle(d=4,$fn=40);
    translate([2.5,-5,0])
      circle(d=4,$fn=40);

    // Column
    translate([-1.2,-3,0])
      circle(d=2.5,$fn=40);
    translate([5,-2,0])
      circle(d=2.5,$fn=40);
    difference(){
      translate([2.5,-5,0])
        circle(d=5.9,$fn=40);
      translate([2.5,-5,0])
        circle(d=4.1,$fn=40);
      translate([0.3,-7,0])
        rotate(45)
          square(6);
    }
    translate([3.85,-3.45])
      square([0.8, 1]);

    t_height = connections[0] == "none" ? 1 : half_height-7.8;
    echo("h", 2-half_height, t_height);
    translate([-1.3,-t_height-6.8])
      square([0.8, t_height]);
    translate([-1.3,-7.2])
      square([2.2,0.8]);
    difference() {
      translate([5,0,0])
        circle(d=3.35,$fn=40);
      translate([5,-2,0])
        square(4);
    }
    b_height = connections[1] == "none" ? 2 : half_height-2;
    translate([4.2,1])
      square([0.8, b_height]);
    if(connections[1] != "none")
      translate([-1,half_height-1.5])
        square([6,0.8]);
  }
}

module switch_mx_pcb_outline(width=1, height=1) {
  pcb_switch_outline(width=width, height=height);
}
// file: ../../lib/utilities.scad
function reverse(list) = len(list) > 0 ? [for (i = [1:len(list)]) list[len(list)-i]] : [];
function pop(list) = len(list) > 0 ? [for (i = [0:len(list)-1]) if (i != 0) list[i]] : [];
// file: ../../lib/switches.scad
use <utilities.scad>
include <switches/mx.scad>
include <switches/choc_v1.scad>

module rotate_translate(rotation, xpos, ypos) {
  if(rotation[0] == undef || rotation[0] == 0) {
    translate([u_mm(xpos), u_mm(ypos), 0]) {
      children();
    }
  } else {
    xoff = rotation[1] == undef ? 0 : rotation[1];
    yoff = rotation[2] == undef ? 0 : rotation[2];
    angle = rotation[0] == undef ? 0 : rotation[0];
    translate([u_mm(xpos - xoff), u_mm(ypos - yoff), 0])
      rotate(angle)
        translate([u_mm(xoff), u_mm(yoff), 0])
          children();
  }
}

module switch(type, style="mx", rgb=true, xpos=0, ypos=0, width=1, cnc=false, rotation=[0,0,0], connections=["hole","hole","hole","hole"], last_xpos=0, last_ypos=0) {
  rotate_translate(rotation, xpos, ypos) {
    if(type == "outline")
      pcb_switch_outline(width=width);
    if(style == "mx") {
      if(type == "key")
        pcb_switch_space_outline(width=width, cnc=cnc, style="mx");
      if(type == "traces")
        switch_mx_pcb_traces(width=width, rgb=rgb, xpos=xpos, ypos=ypos, connections=connections, last_xpos=last_xpos, last_ypos=last_ypos);
      if(type == "traces_top")
        switch_mx_pcb_traces(width=width, single=false, rgb=rgb, xpos=xpos, ypos=ypos, connections=connections, last_xpos=last_xpos, last_ypos=last_ypos);
      if(type == "traces_bottom")
        switch_mx_pcb_traces_bottom(width=width, rgb=rgb, xpos=xpos, ypos=ypos, connections=connections, last_xpos=last_xpos, last_ypos=last_ypos);
      if(type == "drill")
        switch_mx_pcb_drill(width=width, rgb=rgb, connections=connections);
      if(type == "drill_double")
        switch_mx_pcb_drill(width=width, single=false, rgb=rgb, connections=connections);
    }

    if(style == "choc_v1") {
      if(type == "key")
        pcb_switch_space_outline(width=width, cnc=cnc, style="choc_v1");
      if(type == "traces")
        switch_choc_v1_pcb_traces(width=width);
      if(type == "traces_top")
        switch_choc_v1_pcb_traces(width=width);
      if(type == "traces_bottom")
        assert(false, "traces_bottom is incompatible with choc_v1");
      if(type == "drill")
        switch_choc_v1_pcb_drill(width=width);
      if(type == "drill_double")
        switch_choc_v1_pcb_drill(width=width, single=false);
    }

    if(style == "redragon") {
      if(type == "key")
        pcb_switch_space_outline(width=width, cnc=cnc, style="redragon");
      if(type == "traces")
        switch_mx_pcb_traces(width=width, rgb=rgb);
      if(type == "traces_top")
        switch_mx_pcb_traces(width=width, single=false, rgb=rgb);
      if(type == "traces_bottom")
        switch_mx_pcb_traces_bottom(width=width, rgb=rgb);
      if(type == "traces")
        switch_mx_pcb_traces(width=width, rgb=rgb);
      if(type == "drill")
        switch_mx_pcb_drill(width=width);
      if(type == "drill_double")
        switch_mx_pcb_drill(width=width, single=false);
    }
  }
}

module switch_row(keys, style="mx", rgb=true, margin=5, thickness=10, depth=0, cnc=false, type="key", last_row=[], last_xpos=0, previous_xpos=0, last_ypos=0, previous_ypos=0) {
  width = keys[0][0] == undef ? 1 : keys[0][0];
  xpos = keys[0][1] == undef ? 0 : keys[0][1];
  ypos = keys[0][2] == undef ? 0 : keys[0][2];
  rotation = keys[0][3] == undef ? [0,0,0] : keys[0][3];
  connections = keys[0][4] == undef ? ["hole","hole","hole","hole"] : keys[0][4];
  last_ypos = last_row[0][2] == undef ? last_ypos - previous_ypos : last_row[0][2]+last_ypos - previous_ypos;
  last_xpos = last_row[0][1] == undef ? last_xpos - previous_xpos : last_row[0][1]+last_xpos - previous_xpos;
  switch(type, style=style, rgb=rgb, xpos=xpos, ypos=ypos, width=width, cnc=cnc, rotation=rotation, connections=connections, last_xpos=last_xpos, last_ypos=last_ypos);
  if(len(keys) > 1) {
    translate([xpos*key_size+width*key_size, ypos*key_size, 0])
      switch_row(pop(keys), style=style, rgb=rgb, margin=margin, thickness=thickness, depth=depth, cnc=cnc, type=type, last_row = pop(last_row), last_xpos=last_xpos, previous_xpos=xpos, last_ypos=last_ypos, previous_ypos=ypos);
  }
}

module switches(switches, style="mx", rgb=true, margin=5, thickness=10, depth=0, cnc=false, type="key", last_row=[]) {
  if(len(switches) != 0) {
    switch_row(switches[0], style=style, rgb=rgb, margin=margin, thickness=thickness, depth=depth, cnc=cnc, type=type, last_row=last_row);
    if(len(switches) > 1) {
      last_row = switches[0];
      translate([0, key_size, 0])
        switches(pop(switches), style=style, rgb=rgb, margin=margin, depth=depth, thickness=thickness, cnc=cnc, type=type, last_row=last_row);
    }
  }
}
// file: ../../lib/case.scad
include <variables.scad>
use <utilities.scad>
use <circuits.scad>

function key_width(key) = (key[0] == undef ? 1 : key[0]) + (key[1] == undef ? 0 : key[1]);
function width_row(row) = len(row) == 0 ? 0 : key_width(row[0]) + width_row(pop(row));
function width_board(rows) = len(rows) == 0 ? 0 : (
  let (current = width_row(rows[0]))
  let (next = width_board(pop(rows)))
    current > next ? current : next);

function key_height(key) = (key[2] == undef ? 0 : key[2]);
function height_row(row) = len(row) == 0 ? [0,0] : (
  let(other_rows = height_row(pop(row)))
  let(current = key_height(row[0]) + other_rows[0])
  let(maximum = current > other_rows[1] ? current : other_rows[1])
  [current, maximum]);
function height_board_rec(rows) = len(rows) == 0 ? 0 : (
  let (current = height_row(reverse(rows[0]))[1])
  let (next = height_board_rec(pop(rows)))
    current > next ? current : next);
function height_board(rows) = 
  let (height_rec = height_board_rec(rows))
    len(rows) + (height_rec > 0 ? height_rec : 0);

module case(rows, style="mx", margin=5, thickness=5, depth=0, radius=2, rest=0, circuits=[], _inherit_children="unset") {
  total_thickness = thickness + depth + height_for_style(style);
  z_offset = depth + height_for_style(style);
  if($children != 0 && (_inherit_children == "unset" || _inherit_children > 0)) {
    translate([0, 0, -z_offset])
      linear_extrude(total_thickness)
        offset(margin)
          children();
  } else {
    width=u_mm(width_board(rows))+margin*2;
    height=u_mm(height_board(rows))+margin*2+rest;
    translate([-margin, -margin, -z_offset]){
      translate([radius, 0, 0])
        cube([width-radius*2, height,total_thickness]);
      translate([0, radius, 0])
        cube([width, height-radius*2,total_thickness]);
      translate([radius, radius, 0])
        cylinder(total_thickness,radius,radius, $fn=60);
      translate([width-radius, radius, 0])
        cylinder(total_thickness,radius,radius, $fn=60);
      translate([width-radius, height-radius, 0])
        cylinder(total_thickness,radius,radius, $fn=60);
      translate([radius, height-radius, 0])
        cylinder(total_thickness,radius,radius, $fn=60);
    }
    if(len(circuits) > 0)
      translate([0, 0, -z_offset])
        linear_extrude(total_thickness)
          offset(margin)
            circuits_pcb_outline(circuits);
  }
}
// file: ../../lib/variables.scad
key_size=19.05;
hole=14;

function u_mm(u) = u*key_size;
function hole_offset(u) = (key_size-hole)/2+u_mm(u-1)/2;

// This is used to determine how much space is between the top
// of the plate and the PCB.
function height_for_style(style) = style == "mx"        ? 5.334 :
                                   style == "redragon" ? 3.75  :
                                   style == "choc_v1"   ? 2.2   :  "invalid style";
// main file
use <../../keyboard.scad>

layout = [
  [[],[]],
  [[],[]]
];
top_case(layout, depth=6)
  translate([u_mm(1),u_mm(1),0])
    circle(d=u_mm(3));
